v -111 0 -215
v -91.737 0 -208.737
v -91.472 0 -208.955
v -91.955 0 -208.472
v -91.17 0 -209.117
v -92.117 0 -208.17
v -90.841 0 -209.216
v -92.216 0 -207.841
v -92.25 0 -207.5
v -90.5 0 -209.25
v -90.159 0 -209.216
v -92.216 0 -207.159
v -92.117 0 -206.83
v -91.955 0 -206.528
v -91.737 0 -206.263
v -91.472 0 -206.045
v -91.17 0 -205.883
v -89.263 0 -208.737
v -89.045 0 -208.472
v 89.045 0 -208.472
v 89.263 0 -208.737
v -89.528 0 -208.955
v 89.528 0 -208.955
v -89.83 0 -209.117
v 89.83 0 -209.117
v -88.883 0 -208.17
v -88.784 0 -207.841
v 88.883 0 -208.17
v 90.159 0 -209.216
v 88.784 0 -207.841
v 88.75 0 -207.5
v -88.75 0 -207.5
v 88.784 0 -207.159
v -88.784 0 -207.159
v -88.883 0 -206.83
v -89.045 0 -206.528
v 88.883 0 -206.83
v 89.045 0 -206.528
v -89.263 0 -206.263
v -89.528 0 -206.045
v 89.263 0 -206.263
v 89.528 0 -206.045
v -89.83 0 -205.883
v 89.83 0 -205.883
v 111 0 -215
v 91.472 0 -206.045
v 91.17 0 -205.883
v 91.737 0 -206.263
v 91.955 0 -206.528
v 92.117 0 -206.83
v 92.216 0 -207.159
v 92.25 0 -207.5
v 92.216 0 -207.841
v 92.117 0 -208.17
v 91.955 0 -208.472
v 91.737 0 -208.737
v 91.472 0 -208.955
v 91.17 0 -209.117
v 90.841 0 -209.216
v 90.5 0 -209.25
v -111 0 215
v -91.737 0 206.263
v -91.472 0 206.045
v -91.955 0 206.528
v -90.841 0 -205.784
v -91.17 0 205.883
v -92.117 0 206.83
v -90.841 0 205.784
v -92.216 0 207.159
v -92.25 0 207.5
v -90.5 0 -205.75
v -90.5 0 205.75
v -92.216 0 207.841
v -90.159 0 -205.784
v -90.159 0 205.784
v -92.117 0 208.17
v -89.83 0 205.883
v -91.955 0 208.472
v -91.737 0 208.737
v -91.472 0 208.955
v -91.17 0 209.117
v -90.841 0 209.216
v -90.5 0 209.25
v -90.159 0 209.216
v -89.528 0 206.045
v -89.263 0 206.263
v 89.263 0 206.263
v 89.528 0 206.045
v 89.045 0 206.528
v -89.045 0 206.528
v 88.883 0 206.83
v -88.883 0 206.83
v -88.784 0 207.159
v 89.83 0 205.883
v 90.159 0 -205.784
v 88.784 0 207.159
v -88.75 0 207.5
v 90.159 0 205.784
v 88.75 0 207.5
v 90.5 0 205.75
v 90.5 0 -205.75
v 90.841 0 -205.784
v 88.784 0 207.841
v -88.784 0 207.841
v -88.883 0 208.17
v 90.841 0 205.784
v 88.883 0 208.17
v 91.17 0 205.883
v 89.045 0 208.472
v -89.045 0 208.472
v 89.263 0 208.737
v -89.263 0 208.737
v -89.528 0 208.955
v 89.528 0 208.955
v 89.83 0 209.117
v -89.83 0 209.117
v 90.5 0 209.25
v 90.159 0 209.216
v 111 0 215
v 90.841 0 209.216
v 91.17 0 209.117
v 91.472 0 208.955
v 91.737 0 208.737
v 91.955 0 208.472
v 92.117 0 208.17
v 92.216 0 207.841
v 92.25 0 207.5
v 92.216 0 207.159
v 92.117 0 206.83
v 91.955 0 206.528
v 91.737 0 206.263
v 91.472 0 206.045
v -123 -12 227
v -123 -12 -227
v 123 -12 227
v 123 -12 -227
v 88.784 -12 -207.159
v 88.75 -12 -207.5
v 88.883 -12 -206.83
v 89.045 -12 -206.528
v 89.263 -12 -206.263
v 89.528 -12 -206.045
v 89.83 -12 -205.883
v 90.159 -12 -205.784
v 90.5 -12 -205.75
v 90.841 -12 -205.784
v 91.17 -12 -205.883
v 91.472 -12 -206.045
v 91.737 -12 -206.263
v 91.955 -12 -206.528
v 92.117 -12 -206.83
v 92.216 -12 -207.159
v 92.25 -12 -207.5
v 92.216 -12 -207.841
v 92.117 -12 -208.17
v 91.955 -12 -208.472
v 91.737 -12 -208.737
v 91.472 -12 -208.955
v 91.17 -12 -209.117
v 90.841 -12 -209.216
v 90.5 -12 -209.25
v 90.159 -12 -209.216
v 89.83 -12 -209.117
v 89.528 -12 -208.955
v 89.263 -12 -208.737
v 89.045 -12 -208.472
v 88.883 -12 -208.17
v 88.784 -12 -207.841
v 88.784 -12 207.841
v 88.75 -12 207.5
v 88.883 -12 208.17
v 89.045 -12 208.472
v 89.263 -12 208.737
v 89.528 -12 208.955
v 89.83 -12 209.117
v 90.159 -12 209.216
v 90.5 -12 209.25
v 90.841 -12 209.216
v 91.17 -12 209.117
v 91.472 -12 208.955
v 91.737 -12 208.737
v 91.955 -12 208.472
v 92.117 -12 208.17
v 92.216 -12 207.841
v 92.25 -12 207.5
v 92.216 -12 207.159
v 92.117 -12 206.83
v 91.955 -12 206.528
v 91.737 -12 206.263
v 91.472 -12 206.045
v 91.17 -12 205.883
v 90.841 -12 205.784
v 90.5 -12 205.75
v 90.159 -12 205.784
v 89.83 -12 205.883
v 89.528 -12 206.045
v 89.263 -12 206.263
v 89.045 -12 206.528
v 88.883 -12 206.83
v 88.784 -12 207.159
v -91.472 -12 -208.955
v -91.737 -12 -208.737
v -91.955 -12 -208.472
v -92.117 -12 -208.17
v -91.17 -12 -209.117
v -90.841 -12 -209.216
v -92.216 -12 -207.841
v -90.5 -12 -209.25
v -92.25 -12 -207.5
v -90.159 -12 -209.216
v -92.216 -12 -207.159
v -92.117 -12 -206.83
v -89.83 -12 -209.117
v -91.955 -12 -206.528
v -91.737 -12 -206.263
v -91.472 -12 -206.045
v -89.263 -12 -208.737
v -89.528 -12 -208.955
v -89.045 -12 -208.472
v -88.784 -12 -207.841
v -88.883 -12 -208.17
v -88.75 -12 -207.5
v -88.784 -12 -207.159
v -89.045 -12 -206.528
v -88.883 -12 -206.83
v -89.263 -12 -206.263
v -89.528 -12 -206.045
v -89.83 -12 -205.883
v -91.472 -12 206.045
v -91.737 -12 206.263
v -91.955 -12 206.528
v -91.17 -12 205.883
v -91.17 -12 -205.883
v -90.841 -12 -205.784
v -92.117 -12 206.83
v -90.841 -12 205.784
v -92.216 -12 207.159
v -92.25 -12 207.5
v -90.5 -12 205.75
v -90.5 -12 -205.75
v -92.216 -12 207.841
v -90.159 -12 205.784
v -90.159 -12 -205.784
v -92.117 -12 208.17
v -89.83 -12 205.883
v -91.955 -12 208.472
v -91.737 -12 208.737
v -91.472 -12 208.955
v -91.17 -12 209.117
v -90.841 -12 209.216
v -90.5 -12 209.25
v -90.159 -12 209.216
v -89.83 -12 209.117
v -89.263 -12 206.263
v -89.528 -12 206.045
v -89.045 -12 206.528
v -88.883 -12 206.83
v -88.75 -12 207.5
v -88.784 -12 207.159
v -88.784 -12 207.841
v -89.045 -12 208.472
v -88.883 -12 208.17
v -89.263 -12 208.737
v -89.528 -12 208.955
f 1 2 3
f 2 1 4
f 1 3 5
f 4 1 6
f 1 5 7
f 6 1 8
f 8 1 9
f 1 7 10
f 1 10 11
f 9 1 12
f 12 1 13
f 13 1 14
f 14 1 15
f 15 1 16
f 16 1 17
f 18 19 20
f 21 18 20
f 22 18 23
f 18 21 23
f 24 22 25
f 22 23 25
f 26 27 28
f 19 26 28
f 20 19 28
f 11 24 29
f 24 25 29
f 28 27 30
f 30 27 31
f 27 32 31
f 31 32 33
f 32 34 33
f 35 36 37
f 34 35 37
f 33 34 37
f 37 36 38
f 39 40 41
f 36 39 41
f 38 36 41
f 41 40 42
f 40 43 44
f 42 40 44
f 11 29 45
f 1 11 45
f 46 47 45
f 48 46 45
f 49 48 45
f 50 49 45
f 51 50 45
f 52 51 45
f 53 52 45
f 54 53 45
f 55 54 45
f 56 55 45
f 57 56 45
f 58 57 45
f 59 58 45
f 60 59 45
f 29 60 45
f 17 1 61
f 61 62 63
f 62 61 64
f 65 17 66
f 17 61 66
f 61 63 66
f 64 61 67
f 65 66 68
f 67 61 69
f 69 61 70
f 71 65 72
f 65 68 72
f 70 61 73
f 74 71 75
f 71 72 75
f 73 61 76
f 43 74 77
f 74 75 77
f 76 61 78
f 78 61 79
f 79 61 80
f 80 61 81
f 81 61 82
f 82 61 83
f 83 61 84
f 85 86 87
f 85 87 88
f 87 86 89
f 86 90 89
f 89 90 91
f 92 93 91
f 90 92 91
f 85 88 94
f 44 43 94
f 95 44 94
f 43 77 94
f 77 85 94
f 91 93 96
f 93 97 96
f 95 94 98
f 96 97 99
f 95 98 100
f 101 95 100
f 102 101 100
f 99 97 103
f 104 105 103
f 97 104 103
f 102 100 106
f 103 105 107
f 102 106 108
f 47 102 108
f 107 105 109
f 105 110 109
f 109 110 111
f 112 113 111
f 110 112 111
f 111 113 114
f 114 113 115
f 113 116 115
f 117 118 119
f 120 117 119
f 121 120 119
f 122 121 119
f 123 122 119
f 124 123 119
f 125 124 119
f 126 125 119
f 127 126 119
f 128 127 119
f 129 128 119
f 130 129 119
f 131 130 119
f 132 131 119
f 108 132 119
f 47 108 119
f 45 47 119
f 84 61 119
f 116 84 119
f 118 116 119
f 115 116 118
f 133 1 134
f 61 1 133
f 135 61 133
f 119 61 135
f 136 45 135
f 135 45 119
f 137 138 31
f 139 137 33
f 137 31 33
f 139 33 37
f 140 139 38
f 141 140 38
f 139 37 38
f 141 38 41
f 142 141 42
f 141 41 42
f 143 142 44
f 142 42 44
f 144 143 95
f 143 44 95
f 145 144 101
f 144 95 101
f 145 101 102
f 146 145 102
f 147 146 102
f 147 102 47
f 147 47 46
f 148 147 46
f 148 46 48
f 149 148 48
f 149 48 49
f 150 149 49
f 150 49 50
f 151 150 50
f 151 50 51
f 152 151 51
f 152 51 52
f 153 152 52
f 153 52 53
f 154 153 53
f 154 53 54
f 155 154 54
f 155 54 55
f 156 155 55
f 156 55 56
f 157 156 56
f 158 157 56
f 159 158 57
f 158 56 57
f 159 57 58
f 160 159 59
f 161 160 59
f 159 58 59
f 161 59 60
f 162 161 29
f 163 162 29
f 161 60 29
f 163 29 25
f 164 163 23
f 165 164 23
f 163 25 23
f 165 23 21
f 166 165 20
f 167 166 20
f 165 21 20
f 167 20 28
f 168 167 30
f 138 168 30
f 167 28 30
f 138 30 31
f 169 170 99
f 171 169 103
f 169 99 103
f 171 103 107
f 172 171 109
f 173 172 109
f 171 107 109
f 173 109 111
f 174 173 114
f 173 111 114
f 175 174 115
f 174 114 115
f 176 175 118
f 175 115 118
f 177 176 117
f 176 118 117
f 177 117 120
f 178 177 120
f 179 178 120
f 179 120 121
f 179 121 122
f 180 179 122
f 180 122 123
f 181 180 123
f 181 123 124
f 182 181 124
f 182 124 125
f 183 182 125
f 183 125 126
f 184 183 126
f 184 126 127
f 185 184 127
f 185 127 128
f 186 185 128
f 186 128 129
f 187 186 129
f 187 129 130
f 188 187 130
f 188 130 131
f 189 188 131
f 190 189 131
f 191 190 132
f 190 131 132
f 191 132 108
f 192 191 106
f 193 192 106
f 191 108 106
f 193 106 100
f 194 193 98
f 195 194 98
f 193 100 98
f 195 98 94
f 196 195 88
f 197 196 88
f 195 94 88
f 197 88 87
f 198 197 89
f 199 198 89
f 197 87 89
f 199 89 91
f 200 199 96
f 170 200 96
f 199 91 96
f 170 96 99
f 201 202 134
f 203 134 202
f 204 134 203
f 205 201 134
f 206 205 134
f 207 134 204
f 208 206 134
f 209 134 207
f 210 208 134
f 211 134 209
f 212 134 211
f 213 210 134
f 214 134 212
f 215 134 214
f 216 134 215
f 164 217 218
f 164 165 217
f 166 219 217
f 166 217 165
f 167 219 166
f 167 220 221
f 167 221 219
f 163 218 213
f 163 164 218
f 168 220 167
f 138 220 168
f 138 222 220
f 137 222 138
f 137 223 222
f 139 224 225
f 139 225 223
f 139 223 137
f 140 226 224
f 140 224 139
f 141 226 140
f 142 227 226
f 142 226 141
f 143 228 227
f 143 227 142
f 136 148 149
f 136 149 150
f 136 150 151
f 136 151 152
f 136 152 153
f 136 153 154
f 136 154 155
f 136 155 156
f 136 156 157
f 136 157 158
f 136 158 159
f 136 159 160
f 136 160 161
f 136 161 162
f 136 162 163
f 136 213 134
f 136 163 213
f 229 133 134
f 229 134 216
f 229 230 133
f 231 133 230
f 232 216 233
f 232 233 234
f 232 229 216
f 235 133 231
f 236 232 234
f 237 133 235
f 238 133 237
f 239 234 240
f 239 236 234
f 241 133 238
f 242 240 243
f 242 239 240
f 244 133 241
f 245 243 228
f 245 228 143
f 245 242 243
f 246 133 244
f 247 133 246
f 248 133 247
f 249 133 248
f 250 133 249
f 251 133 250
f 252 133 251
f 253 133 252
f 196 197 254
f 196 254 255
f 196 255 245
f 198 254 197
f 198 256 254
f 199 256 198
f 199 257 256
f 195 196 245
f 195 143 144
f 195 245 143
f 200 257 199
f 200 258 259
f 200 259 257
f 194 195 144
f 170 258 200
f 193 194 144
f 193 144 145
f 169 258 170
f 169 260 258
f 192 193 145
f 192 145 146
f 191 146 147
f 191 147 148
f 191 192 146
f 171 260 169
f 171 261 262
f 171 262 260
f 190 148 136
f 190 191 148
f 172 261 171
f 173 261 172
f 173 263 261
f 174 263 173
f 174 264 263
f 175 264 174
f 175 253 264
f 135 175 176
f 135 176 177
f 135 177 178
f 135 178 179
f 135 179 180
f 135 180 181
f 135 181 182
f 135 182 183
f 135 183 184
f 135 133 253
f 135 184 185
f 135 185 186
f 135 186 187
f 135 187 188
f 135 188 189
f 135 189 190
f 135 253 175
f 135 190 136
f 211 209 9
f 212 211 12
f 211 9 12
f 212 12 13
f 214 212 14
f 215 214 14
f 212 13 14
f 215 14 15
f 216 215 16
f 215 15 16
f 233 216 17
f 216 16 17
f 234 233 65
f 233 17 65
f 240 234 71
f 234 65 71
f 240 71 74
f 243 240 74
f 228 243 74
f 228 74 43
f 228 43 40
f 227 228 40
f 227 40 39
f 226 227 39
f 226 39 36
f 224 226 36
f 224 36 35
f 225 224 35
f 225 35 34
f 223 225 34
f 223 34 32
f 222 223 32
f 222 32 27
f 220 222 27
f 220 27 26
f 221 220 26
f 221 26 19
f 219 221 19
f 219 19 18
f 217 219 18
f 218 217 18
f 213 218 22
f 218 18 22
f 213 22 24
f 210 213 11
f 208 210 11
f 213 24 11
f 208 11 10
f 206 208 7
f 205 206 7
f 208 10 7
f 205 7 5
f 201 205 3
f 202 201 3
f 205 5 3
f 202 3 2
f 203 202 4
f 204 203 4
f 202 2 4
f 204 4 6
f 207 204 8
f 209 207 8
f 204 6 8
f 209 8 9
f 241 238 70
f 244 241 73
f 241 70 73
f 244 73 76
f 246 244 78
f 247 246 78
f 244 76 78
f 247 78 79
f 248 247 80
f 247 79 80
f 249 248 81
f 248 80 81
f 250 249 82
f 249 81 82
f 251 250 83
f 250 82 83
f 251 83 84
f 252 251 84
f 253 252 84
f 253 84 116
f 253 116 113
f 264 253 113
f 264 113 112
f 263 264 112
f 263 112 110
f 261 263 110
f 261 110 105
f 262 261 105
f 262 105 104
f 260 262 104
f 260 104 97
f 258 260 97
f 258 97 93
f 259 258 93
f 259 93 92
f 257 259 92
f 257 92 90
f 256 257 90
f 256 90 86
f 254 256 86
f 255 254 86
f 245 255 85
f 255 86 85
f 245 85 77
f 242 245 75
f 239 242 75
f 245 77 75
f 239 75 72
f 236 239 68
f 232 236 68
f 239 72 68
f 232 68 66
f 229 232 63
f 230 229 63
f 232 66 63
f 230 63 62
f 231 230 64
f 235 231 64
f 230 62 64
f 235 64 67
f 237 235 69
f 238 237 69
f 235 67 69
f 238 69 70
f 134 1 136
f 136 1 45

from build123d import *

# Parameters (mm, degrees)
F0_W     = 246
F0_H     = 454
F1_DEPTH = 12
F2_SIZE  = 11.99999
F4_D     = 3.5


# Not quite as in the source:
# - a fillet or chamfer is up to 0.001 mm smaller than in the source, because OpenCascade refuses the exact size


with BuildPart() as f1:
    # F0 (on Front) → F1 (new body)
    with BuildSketch(Plane.XZ):
        Rectangle(F0_W, F0_H)
    extrude(amount=F1_DEPTH)

    # F2 (size 12 in the source; OpenCascade refuses exactly that, so slightly less here)
    f2_edges = [f1.edges().sort_by_distance(p)[0] for p in [
        (0, 0, 227),
        (-123, 0, 0),
        (0, 0, -227),
        (123, 0, 0),
    ]]
    chamfer(f2_edges, length=F2_SIZE)

    # F4 (through all)
    with Locations(Plane.XZ.offset(12)):
        with Locations((-90.5, 207.5), (90.5, 207.5), (90.5, -207.5), (-90.5, -207.5)):
            Hole(F4_D / 2)


solid = f1.part
